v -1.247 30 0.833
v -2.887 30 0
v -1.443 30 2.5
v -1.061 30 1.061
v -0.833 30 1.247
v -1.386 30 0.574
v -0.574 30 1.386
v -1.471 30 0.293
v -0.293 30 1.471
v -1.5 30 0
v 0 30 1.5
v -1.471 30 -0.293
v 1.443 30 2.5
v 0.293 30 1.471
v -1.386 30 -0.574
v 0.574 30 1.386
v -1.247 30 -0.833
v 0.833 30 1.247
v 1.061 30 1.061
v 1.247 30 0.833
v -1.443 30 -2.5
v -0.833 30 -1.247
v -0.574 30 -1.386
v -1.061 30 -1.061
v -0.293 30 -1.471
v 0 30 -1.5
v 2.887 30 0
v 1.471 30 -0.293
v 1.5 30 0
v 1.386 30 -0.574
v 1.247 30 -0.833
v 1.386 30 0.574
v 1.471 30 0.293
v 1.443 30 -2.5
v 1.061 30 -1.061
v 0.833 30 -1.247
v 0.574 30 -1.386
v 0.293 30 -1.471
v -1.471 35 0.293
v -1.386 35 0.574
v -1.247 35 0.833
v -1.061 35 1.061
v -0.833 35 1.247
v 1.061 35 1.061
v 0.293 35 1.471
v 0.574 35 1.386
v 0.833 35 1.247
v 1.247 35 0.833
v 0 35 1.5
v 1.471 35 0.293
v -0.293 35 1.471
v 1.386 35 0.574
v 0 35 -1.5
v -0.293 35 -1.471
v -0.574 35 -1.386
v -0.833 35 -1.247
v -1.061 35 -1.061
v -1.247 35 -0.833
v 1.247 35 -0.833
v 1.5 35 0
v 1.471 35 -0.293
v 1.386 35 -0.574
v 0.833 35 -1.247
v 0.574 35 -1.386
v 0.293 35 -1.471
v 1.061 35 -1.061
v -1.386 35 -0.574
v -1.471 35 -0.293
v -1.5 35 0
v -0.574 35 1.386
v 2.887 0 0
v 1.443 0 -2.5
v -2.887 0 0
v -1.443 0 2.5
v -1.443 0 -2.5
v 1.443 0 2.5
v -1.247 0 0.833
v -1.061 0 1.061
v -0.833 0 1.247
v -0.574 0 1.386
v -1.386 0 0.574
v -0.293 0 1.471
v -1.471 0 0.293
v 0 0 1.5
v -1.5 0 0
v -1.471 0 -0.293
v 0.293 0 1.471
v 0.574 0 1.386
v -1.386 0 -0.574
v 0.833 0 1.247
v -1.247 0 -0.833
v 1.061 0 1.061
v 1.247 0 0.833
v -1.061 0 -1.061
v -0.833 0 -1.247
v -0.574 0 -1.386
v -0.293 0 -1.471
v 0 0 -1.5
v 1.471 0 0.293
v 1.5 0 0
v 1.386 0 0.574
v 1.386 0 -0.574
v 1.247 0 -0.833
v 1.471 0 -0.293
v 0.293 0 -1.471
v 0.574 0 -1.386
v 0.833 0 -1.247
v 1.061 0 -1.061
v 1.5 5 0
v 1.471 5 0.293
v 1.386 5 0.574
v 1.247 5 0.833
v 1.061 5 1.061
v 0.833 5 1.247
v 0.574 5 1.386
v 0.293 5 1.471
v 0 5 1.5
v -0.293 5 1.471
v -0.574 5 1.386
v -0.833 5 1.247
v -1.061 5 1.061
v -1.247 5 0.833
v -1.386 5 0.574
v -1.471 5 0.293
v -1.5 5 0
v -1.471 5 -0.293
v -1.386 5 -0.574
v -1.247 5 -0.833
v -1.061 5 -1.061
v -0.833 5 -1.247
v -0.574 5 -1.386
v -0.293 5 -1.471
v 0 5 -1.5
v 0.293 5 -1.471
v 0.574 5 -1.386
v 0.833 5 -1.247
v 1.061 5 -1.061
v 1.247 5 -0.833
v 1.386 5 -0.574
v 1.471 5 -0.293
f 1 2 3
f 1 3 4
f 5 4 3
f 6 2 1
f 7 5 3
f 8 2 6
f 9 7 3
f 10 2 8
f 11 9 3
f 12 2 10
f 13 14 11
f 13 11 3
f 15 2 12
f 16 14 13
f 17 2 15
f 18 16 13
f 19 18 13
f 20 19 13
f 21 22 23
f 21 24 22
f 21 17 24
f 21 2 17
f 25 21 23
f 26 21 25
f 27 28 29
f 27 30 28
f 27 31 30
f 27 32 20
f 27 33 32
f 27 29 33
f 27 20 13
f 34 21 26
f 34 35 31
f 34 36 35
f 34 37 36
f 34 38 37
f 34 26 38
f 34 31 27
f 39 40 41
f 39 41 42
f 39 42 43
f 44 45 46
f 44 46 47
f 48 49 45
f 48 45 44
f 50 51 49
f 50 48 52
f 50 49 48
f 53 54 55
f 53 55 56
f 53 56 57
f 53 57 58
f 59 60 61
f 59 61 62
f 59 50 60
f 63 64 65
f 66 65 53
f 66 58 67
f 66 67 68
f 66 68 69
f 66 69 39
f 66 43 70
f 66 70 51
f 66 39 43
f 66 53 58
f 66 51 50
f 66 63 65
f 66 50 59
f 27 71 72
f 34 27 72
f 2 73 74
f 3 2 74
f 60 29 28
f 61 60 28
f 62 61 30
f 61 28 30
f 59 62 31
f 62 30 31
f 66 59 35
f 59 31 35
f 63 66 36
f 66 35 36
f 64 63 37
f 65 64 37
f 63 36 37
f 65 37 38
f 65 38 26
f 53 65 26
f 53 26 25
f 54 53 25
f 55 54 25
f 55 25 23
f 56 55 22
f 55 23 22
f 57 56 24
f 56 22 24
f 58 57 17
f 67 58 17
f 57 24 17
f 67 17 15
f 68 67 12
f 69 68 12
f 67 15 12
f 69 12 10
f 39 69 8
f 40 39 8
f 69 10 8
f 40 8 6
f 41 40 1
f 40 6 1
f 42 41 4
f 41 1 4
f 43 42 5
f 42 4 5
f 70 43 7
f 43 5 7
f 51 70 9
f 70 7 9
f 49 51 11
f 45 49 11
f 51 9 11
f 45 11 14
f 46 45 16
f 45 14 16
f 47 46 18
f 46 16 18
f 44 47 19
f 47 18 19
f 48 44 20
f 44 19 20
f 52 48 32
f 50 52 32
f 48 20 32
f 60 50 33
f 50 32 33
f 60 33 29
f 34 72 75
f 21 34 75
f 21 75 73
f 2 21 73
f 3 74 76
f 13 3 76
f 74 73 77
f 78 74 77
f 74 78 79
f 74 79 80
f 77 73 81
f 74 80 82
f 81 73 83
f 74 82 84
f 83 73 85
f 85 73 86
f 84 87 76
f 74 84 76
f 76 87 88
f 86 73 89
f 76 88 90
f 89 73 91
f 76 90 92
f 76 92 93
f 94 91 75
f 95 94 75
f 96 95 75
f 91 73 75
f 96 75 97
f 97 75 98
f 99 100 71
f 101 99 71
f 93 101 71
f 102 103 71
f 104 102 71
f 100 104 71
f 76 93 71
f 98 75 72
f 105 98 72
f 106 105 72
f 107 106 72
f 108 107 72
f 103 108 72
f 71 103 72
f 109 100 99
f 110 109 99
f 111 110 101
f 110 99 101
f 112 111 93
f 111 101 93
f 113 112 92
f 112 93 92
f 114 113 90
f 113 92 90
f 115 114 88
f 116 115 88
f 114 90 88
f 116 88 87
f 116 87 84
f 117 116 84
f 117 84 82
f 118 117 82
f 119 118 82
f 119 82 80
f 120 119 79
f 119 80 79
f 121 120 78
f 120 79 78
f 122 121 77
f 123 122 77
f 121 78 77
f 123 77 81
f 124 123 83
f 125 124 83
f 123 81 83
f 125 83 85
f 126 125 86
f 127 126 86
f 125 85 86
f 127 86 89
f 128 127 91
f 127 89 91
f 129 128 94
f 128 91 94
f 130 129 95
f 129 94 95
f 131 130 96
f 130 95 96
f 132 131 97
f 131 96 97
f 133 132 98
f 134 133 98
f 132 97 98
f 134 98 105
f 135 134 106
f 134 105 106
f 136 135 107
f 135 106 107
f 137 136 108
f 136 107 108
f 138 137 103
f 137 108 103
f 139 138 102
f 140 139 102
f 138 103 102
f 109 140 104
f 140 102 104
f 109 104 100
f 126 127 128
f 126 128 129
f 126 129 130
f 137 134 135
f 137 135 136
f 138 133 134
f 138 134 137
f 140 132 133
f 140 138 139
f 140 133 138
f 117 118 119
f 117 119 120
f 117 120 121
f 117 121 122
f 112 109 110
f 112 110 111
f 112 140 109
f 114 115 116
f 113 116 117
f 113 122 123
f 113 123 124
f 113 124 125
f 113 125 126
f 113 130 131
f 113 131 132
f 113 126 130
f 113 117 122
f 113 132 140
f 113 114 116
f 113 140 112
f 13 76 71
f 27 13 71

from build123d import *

# Parameters (mm, degrees)
EXTRUDE_1_DEPTH     = 30
SKETCH_2_R          = 1.5
EXTRUDE_2_DEPTH     = 5
SKETCH_3_R          = 1.5
CUT_EXTRUDE_1_DEPTH = 5


with BuildPart() as part:
    # 草圖1 → 填料-伸長1 (new body)
    with BuildSketch(Plane(origin=(0, 0, 0), x_dir=(1, 0, 0), z_dir=(0, 1, 0))):
        Polygon((2.886751346, 0), (1.443375673, 2.5), (-1.443375673, 2.5), (-2.886751346, 0), (-1.443375673, -2.5), (1.443375673, -2.5), align=None)
    extrude(amount=EXTRUDE_1_DEPTH)

    # 草圖2 → 填料-伸長2 (add)
    with BuildSketch(Plane(origin=(0, 30, 0), x_dir=(1, 0, 0), z_dir=(0, 1, 0))):
        Circle(SKETCH_2_R)
    extrude(amount=EXTRUDE_2_DEPTH)

    # 草圖3 → 除料-伸長1 (cut)
    with BuildSketch(Plane.XZ):
        Circle(SKETCH_3_R)
    extrude(amount=-CUT_EXTRUDE_1_DEPTH, mode=Mode.SUBTRACT)


solid = part.part
